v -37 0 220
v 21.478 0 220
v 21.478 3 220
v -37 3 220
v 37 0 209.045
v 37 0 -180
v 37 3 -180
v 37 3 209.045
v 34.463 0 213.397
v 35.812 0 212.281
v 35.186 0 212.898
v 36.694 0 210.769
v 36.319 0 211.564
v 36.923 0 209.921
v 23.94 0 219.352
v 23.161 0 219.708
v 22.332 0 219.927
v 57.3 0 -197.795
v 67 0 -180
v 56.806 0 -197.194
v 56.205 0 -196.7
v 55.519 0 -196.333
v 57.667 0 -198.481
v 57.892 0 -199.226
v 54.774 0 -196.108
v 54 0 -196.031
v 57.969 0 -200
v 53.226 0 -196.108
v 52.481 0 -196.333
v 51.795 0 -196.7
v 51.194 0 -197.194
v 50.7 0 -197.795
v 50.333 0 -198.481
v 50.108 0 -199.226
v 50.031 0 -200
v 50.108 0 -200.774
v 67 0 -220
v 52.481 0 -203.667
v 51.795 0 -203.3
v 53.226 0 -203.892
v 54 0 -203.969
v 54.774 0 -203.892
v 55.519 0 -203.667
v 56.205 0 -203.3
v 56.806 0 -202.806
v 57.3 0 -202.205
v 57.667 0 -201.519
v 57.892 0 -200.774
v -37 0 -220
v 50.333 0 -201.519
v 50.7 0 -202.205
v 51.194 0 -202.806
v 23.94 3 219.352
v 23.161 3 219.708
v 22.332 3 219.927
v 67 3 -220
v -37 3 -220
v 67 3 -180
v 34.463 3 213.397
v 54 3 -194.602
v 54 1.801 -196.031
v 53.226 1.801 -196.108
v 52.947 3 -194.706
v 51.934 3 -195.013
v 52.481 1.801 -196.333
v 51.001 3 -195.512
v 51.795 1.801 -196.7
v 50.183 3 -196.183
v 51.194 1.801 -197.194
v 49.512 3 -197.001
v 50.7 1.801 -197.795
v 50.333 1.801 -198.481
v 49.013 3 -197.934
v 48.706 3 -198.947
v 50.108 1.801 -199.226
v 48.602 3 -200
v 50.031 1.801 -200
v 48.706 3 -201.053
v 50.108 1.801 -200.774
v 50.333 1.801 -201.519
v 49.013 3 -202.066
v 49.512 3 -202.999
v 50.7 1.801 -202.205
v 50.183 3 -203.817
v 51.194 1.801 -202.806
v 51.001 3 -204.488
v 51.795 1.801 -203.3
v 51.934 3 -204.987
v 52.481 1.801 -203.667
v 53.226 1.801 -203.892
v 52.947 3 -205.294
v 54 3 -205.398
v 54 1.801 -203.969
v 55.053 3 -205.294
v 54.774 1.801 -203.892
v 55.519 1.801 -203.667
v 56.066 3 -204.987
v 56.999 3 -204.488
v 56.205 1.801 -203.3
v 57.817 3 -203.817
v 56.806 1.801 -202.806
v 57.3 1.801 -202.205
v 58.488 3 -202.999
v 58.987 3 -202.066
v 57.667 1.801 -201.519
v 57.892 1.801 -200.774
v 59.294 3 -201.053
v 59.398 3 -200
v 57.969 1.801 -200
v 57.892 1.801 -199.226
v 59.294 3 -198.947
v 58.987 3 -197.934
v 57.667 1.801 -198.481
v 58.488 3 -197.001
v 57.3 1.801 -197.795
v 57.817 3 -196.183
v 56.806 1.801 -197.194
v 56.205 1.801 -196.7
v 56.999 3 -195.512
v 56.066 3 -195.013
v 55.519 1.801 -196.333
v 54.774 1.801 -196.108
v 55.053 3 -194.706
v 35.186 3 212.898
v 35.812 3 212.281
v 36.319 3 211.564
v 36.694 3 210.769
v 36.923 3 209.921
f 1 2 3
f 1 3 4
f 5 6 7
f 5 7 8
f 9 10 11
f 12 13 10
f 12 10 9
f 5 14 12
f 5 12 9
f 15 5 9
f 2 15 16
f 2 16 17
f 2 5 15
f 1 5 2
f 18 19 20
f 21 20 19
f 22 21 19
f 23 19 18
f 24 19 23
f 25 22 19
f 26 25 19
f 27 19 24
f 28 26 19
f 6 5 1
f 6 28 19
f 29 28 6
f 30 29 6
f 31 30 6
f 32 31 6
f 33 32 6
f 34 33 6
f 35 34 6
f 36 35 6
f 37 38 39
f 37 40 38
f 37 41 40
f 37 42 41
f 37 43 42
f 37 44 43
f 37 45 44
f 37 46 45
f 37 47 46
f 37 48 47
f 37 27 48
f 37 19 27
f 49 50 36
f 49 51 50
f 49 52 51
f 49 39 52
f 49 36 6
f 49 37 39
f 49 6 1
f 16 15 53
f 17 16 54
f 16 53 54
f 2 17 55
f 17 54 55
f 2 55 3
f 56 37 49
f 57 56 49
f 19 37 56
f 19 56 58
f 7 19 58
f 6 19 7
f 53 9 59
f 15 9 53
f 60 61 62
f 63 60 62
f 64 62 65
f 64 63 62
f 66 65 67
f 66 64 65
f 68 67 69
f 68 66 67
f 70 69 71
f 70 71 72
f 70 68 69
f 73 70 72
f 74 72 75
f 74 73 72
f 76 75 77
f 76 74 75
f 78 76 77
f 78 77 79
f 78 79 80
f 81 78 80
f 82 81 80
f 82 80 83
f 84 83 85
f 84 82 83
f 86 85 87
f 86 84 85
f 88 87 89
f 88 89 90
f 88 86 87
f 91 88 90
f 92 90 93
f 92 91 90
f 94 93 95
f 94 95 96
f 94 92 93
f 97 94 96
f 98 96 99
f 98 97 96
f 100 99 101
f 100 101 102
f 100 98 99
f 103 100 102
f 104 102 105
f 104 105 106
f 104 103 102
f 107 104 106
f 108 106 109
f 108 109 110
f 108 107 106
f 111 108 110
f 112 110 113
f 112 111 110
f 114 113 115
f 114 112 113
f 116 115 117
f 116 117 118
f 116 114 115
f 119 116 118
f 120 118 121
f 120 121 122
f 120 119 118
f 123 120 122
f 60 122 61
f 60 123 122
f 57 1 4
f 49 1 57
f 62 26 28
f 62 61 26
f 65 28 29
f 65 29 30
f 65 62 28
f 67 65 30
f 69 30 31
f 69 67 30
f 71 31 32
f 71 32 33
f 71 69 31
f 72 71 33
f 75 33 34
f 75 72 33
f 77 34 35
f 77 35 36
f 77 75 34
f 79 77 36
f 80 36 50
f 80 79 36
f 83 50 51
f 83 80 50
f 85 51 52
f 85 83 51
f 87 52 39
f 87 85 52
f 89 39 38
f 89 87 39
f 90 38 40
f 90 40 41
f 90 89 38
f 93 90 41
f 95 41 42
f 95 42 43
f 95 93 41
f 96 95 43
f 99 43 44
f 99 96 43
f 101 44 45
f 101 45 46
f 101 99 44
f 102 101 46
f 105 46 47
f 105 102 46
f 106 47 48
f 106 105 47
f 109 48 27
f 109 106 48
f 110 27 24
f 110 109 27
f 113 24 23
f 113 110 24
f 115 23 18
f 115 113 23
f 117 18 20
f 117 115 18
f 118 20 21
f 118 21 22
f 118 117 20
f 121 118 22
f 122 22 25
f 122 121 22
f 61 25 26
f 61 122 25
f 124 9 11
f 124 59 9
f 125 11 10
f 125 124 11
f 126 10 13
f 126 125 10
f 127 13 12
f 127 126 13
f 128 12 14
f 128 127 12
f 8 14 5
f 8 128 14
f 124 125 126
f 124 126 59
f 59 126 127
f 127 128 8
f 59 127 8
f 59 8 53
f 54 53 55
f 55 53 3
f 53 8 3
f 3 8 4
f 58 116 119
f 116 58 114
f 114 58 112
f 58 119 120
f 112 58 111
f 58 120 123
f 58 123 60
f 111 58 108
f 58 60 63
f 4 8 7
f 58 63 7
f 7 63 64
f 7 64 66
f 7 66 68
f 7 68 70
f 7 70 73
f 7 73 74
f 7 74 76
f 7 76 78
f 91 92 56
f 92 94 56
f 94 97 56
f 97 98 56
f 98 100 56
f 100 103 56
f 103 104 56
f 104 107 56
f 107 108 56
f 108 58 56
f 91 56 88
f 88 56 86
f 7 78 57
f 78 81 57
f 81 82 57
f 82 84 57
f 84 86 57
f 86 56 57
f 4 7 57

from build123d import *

# Parameters (mm, degrees)
BOSS_EXTRUDE2_DEPTH = 3
CUT_EXTRUDE1_DEPTH  = 10
FILLET1_R           = 5
FILLET2_R           = 5


with BuildPart() as part:
    # Sketch1 → Boss-Extrude2 (new body)
    with BuildSketch(Plane(origin=(0, 0, 0), x_dir=(1, 0, 0), z_dir=(0, 1, 0))):
        Polygon((37, 220), (67, 220), (67, 180), (37, 180), (37, -220), (-37, -220), (-37, 220), align=None)
    extrude(amount=BOSS_EXTRUDE2_DEPTH)

    # Sketch3 → 3/8-16 Tapped Hole1 (revolve, cut)
    with BuildSketch(Plane(origin=(54, 3, -200), x_dir=(0, 0, 1), z_dir=(1, 0, 0))):
        Polygon((0, 0), (0, 3), (3.96875, 3), (3.96875, 1.198863598), (5.3975, 0), align=None)
    revolve(axis=Axis((54, 9.35, -200), (0, -1, 0)), mode=Mode.SUBTRACT)

    # Sketch5 → Cut-Extrude1 (cut)
    with BuildSketch(Plane.XZ):
        Polygon((37, 220), (37, 211.960805492), (22.794358884, 220), align=None)
    extrude(amount=-CUT_EXTRUDE1_DEPTH, mode=Mode.SUBTRACT)

    # Fillet1
    fillet1_edges = [part.edges().sort_by_distance(p)[0] for p in [
        (37, 1.5, 211.960805492),
    ]]
    fillet(fillet1_edges, radius=FILLET1_R)

    # Fillet2
    fillet2_edges = [part.edges().sort_by_distance(p)[0] for p in [
        (22.794358884, 1.5, 220),
    ]]
    fillet(fillet2_edges, radius=FILLET2_R)


solid = part.part
